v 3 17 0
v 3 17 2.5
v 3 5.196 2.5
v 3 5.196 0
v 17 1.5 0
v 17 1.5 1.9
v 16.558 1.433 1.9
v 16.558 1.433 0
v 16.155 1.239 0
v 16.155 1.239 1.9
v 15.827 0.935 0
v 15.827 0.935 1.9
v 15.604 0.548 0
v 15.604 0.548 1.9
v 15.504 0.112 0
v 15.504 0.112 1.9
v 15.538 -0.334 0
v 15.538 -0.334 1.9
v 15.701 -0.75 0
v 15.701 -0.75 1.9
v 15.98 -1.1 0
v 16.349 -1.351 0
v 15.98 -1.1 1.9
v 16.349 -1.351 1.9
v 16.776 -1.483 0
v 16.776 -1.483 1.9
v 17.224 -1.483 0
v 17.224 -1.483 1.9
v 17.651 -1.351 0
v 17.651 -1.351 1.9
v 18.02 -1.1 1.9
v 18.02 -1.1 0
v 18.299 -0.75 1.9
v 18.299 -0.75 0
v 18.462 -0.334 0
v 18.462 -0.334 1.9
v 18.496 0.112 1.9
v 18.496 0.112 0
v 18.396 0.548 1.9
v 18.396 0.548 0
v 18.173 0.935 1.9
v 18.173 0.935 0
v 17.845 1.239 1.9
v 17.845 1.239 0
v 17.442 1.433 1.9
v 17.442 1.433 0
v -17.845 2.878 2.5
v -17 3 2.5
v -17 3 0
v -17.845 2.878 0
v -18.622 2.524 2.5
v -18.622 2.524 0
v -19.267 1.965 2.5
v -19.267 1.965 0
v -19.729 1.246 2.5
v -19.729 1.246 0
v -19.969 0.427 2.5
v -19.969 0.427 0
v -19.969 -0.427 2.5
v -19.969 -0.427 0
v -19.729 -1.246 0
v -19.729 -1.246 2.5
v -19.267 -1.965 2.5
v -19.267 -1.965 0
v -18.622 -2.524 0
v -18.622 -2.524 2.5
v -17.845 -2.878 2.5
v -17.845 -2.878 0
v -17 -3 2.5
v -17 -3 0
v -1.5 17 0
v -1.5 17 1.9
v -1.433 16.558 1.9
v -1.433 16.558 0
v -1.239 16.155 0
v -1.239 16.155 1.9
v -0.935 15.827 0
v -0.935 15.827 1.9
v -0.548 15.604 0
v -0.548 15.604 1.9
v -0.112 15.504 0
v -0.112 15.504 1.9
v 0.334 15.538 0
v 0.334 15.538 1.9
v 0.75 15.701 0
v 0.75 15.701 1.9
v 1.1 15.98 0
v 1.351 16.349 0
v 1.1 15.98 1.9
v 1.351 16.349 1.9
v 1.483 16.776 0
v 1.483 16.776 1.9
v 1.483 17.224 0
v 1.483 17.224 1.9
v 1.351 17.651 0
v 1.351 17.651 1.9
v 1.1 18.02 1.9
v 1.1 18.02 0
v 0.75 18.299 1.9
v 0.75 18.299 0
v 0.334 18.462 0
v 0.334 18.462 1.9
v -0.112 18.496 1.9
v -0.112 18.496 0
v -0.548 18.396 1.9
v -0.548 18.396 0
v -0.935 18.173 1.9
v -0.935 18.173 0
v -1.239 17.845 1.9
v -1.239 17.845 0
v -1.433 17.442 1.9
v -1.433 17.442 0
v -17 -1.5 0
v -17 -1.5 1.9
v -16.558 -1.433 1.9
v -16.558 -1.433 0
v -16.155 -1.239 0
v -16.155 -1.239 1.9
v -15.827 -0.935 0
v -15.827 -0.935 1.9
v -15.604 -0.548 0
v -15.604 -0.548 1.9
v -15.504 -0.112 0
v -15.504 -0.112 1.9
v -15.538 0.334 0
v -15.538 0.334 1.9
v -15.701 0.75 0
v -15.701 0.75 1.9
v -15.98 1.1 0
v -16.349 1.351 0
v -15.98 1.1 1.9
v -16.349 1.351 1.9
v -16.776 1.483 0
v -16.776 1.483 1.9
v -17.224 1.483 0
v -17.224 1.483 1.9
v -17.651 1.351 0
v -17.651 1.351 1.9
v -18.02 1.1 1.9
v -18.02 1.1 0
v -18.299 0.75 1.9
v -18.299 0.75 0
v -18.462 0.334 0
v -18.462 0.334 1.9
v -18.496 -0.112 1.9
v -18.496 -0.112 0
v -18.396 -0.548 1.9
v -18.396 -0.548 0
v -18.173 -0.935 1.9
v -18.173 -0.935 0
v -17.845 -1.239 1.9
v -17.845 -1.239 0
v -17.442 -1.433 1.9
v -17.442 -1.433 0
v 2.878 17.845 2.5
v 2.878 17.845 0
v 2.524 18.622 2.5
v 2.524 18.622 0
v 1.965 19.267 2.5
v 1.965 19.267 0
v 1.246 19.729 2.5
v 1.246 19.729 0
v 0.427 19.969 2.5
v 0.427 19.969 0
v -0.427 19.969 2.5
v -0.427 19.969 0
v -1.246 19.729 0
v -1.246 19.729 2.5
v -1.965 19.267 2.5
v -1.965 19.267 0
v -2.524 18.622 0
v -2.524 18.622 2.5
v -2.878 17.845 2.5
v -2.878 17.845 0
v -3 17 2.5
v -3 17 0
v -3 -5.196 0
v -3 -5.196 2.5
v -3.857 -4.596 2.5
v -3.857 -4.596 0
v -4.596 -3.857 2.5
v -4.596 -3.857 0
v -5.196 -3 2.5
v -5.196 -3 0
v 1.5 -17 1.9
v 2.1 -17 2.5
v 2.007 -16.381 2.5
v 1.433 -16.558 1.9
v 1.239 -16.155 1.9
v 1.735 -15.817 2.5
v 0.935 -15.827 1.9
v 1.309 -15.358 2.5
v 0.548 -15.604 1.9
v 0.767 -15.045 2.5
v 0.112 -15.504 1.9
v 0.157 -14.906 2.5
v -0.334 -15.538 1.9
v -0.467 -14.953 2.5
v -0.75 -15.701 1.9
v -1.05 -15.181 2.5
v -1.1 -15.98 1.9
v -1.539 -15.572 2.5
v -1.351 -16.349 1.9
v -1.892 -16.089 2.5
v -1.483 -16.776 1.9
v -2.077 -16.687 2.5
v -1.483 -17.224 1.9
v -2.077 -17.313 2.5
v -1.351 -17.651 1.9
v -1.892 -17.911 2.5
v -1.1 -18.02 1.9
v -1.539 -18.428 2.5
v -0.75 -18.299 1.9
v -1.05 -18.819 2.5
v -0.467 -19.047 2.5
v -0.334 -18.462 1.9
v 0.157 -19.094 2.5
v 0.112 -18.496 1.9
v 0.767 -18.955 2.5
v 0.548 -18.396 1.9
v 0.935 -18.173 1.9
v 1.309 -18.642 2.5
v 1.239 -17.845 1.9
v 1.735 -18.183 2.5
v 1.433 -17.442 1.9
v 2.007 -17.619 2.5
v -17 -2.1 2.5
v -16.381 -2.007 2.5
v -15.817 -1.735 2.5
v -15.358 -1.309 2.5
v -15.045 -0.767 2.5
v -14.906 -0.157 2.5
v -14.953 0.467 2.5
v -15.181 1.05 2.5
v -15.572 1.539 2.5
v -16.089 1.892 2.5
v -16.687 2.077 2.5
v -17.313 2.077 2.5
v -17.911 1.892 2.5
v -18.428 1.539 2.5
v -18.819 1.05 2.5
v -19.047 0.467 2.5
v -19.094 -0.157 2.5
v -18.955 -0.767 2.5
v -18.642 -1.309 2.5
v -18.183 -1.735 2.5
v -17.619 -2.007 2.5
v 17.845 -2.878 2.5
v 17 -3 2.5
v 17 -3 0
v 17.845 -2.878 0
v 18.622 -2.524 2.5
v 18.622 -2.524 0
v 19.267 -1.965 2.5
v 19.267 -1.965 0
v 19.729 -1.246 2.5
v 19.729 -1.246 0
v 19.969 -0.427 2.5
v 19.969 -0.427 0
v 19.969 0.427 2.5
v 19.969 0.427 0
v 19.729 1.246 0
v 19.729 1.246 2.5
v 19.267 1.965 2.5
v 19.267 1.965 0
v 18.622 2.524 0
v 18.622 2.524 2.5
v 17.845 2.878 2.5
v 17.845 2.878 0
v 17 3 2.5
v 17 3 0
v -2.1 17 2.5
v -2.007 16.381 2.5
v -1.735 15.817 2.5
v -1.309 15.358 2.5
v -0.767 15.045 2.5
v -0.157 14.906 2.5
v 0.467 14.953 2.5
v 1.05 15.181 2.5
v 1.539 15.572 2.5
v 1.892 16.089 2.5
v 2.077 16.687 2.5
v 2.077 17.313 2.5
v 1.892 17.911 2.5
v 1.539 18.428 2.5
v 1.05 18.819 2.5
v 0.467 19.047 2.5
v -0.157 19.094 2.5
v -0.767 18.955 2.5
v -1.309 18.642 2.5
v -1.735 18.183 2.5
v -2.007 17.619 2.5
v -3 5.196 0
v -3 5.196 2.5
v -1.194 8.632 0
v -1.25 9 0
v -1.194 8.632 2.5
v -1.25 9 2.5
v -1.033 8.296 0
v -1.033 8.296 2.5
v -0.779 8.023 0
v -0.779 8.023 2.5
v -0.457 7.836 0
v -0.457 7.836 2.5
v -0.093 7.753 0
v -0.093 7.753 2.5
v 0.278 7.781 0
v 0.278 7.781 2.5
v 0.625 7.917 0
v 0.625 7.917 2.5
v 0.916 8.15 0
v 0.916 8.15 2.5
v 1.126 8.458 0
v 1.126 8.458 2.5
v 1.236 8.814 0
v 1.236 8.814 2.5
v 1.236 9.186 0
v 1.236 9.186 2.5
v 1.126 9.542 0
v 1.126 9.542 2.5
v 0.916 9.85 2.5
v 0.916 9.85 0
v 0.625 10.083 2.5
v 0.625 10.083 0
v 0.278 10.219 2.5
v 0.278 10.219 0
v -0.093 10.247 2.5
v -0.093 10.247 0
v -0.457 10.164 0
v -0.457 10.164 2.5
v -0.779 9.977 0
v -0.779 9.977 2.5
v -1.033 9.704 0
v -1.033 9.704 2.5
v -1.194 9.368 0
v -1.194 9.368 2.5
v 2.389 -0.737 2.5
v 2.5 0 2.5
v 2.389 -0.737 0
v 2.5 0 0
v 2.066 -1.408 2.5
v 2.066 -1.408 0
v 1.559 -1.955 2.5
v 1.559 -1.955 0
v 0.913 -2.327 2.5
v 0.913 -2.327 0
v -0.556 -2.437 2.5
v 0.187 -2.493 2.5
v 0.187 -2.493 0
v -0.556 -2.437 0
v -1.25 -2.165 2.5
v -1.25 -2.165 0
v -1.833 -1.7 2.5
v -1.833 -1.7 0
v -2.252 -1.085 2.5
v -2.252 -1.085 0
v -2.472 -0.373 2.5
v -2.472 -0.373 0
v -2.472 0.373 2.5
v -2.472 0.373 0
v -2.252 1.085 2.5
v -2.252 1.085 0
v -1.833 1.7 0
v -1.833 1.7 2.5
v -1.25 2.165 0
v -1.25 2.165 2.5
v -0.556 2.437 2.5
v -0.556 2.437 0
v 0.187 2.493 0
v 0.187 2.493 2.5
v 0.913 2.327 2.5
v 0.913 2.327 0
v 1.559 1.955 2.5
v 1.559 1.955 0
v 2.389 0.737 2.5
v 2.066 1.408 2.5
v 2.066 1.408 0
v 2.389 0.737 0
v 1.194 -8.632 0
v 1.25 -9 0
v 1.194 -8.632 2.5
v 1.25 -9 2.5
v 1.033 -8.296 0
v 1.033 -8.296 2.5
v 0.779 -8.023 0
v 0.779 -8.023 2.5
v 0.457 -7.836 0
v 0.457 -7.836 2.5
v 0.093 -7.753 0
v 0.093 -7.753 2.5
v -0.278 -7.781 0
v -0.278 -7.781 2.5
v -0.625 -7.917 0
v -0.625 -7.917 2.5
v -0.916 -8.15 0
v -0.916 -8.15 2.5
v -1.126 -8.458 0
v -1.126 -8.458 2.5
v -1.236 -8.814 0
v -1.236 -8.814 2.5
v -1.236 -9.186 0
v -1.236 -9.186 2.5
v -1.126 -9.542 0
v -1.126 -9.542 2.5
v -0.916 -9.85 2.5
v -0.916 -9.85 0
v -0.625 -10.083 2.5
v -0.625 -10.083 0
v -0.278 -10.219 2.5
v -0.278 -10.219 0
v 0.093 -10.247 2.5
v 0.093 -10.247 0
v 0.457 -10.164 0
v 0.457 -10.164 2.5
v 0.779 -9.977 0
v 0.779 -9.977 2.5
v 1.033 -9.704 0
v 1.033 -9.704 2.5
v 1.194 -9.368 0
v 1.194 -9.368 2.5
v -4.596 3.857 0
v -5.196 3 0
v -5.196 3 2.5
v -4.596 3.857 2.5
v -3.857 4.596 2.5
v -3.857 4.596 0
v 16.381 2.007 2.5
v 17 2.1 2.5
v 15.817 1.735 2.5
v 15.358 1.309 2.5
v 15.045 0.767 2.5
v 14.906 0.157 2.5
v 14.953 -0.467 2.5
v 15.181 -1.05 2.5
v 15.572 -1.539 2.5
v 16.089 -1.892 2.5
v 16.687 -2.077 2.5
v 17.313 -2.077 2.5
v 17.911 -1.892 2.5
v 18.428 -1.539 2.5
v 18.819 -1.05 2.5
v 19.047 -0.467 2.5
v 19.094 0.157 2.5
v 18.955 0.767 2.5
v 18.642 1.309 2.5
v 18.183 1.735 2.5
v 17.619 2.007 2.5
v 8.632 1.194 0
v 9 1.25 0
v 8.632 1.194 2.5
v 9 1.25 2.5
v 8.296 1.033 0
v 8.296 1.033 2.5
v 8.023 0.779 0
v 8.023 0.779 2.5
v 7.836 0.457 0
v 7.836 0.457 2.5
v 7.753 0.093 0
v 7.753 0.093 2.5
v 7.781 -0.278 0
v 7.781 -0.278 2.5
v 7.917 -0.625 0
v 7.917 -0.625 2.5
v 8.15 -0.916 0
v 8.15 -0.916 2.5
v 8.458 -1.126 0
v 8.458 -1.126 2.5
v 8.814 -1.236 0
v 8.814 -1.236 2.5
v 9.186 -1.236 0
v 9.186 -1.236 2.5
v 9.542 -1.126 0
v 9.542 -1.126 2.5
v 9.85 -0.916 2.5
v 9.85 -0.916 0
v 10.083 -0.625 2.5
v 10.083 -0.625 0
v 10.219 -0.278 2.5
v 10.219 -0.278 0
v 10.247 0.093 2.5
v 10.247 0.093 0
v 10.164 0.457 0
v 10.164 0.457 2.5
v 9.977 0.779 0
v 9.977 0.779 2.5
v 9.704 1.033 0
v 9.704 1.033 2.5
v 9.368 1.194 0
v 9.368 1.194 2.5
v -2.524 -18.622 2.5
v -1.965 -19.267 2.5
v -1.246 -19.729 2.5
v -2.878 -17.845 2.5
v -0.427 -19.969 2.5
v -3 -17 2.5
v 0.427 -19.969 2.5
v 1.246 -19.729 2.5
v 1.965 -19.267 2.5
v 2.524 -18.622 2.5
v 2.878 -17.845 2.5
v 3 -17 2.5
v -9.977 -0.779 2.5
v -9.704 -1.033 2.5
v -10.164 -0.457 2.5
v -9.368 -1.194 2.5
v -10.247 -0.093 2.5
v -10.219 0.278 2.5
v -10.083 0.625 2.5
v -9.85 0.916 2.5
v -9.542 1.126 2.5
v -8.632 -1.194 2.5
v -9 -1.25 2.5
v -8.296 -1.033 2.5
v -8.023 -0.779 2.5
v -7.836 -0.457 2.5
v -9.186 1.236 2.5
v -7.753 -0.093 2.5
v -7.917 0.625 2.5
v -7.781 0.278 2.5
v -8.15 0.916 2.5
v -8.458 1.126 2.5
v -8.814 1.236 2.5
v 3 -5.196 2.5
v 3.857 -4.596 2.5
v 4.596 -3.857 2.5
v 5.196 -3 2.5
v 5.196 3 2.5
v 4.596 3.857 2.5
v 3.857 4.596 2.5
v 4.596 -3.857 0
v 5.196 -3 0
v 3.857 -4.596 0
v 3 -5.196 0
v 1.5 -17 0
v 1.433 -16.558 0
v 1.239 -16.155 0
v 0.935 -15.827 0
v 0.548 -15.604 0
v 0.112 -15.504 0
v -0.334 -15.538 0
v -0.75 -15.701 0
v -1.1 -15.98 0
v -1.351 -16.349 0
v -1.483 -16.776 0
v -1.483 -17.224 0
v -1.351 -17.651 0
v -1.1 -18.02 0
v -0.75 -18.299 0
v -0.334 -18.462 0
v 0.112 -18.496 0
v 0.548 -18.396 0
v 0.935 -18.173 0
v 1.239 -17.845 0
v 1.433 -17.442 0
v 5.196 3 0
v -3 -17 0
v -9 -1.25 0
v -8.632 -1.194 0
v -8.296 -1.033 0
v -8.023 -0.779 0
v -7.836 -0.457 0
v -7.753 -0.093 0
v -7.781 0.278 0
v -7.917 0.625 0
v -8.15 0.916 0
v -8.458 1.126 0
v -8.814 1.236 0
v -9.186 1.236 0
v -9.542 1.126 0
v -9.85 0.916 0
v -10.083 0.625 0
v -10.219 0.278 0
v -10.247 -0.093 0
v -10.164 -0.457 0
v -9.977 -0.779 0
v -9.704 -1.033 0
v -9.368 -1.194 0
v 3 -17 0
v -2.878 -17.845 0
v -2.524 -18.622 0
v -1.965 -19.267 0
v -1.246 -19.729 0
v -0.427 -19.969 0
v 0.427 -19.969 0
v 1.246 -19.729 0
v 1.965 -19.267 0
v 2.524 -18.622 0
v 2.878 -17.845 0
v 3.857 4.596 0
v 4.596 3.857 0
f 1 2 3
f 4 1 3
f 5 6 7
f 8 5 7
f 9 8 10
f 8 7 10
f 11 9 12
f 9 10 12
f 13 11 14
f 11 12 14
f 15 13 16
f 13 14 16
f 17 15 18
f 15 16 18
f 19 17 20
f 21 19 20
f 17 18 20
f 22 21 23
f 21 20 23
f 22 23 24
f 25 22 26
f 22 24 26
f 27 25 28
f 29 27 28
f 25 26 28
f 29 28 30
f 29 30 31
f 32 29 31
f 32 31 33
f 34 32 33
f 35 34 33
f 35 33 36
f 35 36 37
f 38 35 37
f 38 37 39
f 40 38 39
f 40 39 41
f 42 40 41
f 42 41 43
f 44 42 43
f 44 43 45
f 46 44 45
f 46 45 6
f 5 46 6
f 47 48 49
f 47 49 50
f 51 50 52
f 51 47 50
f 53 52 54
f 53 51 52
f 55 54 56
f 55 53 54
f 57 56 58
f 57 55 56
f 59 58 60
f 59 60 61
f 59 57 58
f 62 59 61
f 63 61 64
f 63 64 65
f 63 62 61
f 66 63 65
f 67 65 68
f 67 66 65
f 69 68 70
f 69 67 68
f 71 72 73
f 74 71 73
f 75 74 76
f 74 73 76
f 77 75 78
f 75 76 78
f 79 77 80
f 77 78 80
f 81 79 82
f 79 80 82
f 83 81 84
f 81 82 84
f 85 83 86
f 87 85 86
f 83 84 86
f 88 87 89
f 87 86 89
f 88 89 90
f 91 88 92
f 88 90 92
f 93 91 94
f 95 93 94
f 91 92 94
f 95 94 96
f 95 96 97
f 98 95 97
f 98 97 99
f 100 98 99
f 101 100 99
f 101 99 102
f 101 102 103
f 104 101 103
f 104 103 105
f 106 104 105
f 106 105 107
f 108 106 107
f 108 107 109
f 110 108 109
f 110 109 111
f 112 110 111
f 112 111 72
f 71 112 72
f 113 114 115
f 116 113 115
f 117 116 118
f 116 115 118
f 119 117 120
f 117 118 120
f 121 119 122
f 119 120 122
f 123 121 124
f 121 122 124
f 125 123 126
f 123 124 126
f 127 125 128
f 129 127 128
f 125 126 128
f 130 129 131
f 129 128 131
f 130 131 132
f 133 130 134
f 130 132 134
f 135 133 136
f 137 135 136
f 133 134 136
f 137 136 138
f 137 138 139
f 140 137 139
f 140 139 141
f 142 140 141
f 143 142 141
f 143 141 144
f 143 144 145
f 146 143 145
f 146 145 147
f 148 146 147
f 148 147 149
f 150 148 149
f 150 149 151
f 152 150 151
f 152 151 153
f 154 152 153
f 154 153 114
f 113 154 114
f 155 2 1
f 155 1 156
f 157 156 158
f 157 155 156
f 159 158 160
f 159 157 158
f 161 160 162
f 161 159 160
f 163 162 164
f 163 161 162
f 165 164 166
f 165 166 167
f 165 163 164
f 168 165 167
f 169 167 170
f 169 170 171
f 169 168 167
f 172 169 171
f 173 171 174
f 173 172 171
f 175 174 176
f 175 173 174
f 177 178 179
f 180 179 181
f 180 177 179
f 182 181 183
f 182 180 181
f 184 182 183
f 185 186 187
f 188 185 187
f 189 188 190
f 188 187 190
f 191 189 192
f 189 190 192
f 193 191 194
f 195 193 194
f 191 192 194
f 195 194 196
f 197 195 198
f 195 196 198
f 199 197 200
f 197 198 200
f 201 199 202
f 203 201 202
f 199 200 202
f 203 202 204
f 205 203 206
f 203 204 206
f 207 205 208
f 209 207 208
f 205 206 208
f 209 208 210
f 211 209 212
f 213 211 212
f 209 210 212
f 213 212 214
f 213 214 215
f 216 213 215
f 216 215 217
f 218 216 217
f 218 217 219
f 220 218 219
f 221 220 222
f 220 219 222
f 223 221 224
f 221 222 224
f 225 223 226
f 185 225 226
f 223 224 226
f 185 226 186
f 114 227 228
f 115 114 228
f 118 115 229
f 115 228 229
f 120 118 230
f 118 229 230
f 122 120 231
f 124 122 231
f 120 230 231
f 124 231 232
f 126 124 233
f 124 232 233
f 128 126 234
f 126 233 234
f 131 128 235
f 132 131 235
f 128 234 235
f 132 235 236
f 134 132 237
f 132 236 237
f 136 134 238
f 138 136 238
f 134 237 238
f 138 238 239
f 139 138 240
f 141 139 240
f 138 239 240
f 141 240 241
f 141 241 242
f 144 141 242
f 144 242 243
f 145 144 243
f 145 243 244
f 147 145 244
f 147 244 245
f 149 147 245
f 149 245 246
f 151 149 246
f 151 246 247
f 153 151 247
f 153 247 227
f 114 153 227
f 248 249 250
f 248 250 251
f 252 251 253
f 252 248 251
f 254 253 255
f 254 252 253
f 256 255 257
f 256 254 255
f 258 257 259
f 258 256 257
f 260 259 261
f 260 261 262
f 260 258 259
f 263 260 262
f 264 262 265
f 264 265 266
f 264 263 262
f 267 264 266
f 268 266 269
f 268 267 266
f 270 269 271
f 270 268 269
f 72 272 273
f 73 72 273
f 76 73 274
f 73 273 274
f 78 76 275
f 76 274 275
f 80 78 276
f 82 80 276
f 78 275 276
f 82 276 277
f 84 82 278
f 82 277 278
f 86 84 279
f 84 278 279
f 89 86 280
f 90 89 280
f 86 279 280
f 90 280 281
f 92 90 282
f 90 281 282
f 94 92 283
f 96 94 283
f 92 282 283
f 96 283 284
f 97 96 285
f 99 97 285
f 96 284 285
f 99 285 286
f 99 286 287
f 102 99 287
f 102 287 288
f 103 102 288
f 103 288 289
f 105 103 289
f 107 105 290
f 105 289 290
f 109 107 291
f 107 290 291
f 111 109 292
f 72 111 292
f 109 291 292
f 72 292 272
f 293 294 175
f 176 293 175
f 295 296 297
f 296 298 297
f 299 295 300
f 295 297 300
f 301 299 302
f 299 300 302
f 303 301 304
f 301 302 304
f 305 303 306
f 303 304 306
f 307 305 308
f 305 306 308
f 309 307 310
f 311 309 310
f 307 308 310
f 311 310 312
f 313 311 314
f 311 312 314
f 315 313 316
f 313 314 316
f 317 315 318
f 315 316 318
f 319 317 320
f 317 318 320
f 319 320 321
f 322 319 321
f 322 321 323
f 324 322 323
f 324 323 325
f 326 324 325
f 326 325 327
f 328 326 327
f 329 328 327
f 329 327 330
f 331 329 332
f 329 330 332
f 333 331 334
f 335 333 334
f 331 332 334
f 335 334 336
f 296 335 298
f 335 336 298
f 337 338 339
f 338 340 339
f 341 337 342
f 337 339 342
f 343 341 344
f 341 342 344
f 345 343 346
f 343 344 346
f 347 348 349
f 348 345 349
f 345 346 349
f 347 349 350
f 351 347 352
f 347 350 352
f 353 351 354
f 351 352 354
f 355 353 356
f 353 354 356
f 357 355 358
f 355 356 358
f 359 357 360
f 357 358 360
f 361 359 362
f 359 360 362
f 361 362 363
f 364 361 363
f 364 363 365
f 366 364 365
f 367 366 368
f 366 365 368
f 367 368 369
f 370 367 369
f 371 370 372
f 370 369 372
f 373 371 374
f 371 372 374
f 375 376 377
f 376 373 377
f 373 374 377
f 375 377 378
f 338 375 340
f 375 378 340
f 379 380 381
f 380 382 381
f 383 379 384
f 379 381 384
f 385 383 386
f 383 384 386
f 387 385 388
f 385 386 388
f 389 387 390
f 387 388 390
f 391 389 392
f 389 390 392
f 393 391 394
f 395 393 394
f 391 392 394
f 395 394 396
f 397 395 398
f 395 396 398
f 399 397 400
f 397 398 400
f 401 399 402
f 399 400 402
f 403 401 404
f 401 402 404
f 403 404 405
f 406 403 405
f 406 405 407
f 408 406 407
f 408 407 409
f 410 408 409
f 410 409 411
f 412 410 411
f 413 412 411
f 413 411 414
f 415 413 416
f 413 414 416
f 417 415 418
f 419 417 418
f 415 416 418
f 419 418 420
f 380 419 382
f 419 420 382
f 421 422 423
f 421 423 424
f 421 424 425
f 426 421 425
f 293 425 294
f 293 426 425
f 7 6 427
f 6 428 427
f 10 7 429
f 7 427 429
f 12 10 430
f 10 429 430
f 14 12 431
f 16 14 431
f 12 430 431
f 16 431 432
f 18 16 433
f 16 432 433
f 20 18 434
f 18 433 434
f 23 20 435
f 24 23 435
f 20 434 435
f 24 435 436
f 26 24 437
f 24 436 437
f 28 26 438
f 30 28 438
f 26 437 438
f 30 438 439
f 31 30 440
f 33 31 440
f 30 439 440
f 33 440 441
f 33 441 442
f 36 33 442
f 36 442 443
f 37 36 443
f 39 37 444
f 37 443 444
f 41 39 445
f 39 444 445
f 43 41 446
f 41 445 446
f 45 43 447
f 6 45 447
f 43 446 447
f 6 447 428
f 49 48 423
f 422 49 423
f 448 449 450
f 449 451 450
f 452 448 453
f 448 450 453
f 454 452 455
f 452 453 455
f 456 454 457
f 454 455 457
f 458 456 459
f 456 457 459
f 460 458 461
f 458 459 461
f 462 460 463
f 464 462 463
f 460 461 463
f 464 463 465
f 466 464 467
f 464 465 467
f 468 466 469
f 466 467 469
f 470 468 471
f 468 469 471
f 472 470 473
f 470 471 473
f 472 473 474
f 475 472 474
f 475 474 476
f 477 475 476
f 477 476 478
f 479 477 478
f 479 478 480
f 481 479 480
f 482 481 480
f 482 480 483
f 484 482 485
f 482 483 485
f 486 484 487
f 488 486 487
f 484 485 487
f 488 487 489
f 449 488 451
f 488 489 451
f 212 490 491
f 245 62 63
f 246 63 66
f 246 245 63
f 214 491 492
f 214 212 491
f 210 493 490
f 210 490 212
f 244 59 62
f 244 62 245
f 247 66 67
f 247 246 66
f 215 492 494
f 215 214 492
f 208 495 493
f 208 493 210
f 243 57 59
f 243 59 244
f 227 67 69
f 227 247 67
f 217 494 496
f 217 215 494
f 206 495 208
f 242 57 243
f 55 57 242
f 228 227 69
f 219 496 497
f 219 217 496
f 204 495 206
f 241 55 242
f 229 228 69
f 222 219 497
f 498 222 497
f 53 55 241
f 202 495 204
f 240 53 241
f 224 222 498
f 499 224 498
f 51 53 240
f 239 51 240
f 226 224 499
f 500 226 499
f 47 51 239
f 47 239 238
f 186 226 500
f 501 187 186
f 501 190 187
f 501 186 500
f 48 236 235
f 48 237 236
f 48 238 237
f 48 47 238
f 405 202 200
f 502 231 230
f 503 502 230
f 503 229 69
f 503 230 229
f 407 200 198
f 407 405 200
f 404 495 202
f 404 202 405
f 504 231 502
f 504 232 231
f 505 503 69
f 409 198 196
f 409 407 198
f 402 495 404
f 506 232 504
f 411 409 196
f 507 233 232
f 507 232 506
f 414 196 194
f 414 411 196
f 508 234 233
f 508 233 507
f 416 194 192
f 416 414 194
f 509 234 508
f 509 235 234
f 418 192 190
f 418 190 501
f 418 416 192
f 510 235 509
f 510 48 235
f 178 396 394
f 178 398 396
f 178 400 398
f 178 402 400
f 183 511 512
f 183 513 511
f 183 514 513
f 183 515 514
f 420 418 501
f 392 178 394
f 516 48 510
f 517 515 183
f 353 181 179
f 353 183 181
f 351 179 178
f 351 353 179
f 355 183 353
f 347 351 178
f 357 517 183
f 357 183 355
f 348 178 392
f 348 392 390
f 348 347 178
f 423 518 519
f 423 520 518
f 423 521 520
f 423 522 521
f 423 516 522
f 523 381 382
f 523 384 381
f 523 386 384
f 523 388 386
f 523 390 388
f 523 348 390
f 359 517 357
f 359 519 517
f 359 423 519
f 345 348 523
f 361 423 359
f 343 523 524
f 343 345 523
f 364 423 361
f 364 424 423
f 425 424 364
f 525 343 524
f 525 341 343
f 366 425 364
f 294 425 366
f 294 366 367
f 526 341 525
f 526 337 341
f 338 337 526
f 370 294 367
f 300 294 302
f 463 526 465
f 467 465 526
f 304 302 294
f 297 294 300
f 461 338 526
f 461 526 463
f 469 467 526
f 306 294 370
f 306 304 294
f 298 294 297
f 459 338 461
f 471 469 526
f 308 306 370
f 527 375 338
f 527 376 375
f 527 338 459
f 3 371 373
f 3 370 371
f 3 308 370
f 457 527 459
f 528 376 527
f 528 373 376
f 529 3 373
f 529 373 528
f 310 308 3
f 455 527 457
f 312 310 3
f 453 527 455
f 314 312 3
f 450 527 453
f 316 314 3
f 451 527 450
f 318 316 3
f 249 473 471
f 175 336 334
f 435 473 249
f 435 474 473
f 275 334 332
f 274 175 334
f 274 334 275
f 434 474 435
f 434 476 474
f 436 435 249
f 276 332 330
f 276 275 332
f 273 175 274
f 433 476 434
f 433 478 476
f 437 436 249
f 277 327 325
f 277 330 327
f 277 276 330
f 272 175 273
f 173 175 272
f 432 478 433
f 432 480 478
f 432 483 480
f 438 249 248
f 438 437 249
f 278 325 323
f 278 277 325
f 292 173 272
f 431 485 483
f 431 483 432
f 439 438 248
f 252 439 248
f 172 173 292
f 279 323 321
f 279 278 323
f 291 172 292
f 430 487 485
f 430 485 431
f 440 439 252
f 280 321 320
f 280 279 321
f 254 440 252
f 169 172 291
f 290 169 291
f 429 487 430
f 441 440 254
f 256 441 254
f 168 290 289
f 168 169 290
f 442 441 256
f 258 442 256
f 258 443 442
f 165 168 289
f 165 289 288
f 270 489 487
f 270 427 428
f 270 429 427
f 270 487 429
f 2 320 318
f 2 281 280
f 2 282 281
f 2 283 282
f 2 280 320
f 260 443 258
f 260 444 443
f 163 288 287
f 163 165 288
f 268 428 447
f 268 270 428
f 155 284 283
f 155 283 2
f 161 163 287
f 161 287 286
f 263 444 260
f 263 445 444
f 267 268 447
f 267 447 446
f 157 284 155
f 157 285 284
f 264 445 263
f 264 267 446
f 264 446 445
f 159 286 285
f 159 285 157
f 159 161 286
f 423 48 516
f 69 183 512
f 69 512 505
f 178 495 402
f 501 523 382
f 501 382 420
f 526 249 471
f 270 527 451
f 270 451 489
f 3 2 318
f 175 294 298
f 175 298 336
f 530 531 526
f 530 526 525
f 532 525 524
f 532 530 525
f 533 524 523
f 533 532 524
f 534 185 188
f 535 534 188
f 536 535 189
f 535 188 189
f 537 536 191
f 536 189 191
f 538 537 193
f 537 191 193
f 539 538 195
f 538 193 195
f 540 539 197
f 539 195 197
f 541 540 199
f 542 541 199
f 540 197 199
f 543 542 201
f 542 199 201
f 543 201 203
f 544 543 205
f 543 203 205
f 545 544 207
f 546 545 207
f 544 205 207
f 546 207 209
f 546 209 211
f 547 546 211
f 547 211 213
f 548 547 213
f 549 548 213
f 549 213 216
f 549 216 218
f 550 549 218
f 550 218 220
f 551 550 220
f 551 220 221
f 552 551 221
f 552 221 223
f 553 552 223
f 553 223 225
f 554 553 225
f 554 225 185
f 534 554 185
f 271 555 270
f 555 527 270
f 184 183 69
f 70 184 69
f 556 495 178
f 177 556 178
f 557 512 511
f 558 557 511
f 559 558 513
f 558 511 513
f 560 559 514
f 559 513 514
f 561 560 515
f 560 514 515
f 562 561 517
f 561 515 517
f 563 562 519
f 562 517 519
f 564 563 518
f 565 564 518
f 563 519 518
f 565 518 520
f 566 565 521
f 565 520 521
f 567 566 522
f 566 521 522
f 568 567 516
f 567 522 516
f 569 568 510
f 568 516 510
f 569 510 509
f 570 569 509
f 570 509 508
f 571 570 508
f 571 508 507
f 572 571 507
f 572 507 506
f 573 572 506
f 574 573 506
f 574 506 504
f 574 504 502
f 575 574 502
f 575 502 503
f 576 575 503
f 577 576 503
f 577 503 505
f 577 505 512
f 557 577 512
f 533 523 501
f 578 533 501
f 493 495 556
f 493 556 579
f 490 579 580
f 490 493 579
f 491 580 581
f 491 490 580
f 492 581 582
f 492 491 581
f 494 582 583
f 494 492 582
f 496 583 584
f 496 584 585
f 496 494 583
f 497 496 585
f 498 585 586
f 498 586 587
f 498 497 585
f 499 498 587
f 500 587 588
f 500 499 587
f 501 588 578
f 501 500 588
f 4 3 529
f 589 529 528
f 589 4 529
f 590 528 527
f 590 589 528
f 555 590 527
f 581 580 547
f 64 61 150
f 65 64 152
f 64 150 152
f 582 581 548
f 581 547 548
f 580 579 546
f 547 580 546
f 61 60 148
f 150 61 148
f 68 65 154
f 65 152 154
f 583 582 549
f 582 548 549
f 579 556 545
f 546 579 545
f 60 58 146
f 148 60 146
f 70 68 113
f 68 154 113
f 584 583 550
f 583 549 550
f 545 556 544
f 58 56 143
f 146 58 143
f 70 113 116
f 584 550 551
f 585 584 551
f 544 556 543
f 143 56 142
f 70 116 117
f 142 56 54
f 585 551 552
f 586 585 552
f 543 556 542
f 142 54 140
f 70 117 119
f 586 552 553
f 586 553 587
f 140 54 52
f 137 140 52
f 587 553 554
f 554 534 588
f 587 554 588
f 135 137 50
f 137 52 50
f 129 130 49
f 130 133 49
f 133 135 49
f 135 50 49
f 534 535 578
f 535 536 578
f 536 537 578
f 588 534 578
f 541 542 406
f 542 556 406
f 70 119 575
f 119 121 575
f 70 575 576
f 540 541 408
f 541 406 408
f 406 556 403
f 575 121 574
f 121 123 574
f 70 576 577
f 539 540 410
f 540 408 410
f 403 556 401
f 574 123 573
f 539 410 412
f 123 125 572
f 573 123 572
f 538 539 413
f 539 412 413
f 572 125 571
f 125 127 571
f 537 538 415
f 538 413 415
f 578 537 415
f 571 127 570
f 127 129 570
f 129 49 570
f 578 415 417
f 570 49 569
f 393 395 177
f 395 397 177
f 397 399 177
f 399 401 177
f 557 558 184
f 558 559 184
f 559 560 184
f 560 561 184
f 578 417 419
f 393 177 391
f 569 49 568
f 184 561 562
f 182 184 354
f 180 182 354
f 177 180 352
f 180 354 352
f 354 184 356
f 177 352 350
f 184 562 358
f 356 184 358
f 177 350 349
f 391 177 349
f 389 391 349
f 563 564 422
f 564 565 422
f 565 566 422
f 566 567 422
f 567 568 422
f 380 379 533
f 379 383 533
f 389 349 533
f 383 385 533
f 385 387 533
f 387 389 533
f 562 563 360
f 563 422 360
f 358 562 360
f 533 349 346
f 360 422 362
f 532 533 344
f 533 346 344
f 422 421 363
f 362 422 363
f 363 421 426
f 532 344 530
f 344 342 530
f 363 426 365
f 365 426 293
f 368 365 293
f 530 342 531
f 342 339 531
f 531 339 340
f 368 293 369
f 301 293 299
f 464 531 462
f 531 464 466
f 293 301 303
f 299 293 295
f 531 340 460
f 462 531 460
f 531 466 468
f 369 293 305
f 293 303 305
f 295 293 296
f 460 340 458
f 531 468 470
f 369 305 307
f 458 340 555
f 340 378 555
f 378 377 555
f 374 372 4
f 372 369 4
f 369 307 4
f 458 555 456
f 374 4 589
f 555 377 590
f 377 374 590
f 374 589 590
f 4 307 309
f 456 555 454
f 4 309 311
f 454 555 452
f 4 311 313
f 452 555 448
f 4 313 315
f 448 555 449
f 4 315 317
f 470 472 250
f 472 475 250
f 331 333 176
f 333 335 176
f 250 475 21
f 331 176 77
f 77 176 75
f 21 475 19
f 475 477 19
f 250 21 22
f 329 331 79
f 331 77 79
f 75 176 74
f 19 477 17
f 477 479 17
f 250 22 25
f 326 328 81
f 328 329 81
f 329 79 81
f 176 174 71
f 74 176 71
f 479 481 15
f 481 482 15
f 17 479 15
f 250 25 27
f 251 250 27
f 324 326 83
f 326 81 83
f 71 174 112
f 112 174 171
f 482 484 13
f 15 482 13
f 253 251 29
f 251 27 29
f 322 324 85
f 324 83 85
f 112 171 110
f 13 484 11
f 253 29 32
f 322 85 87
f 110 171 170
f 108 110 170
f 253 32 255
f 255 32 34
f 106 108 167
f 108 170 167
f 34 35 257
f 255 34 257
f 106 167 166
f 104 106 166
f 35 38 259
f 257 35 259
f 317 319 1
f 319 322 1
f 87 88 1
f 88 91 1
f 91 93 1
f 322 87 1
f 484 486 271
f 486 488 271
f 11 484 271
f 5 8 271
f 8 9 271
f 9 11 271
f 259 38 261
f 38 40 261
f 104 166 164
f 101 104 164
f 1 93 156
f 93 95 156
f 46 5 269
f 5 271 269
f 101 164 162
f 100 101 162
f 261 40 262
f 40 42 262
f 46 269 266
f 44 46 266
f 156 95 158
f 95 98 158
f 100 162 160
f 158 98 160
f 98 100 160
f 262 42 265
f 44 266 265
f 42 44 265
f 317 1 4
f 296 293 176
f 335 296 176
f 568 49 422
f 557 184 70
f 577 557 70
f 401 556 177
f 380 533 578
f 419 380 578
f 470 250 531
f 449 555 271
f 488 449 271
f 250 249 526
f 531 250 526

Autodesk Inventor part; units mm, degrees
ref_plane "YZ Plane" through (0, 0, 0) normal (1, 0, 0) x (0, 1, 0)
ref_plane "XZ Plane" through (0, 0, 0) normal (0, 1, 0) x (-1, 0, 0)
ref_plane "XY Plane" through (0, 0, 0) normal (0, 0, 1) x (1, 0, 0)
sketch "Sketch2" plane through (0, 0, 0) normal (0, 0, 1) x (1, 0, 0)
  circle A0 centre (0, 0) radius 2.5
  circle A1 centre (0, 0) radius 6
  dimension "d12" = 5
  dimension "d13" = 12
extrude "Extrusion1" add sketch "Sketch2" along normal blind 2.5
sketch "Sketch3" plane through (0, 0, 2.5) normal (0, 0, 1) x (1, 0, 0)
  circle A0 centre (0, 0) radius 2.5 projected
  circle A1 centre (0, 0) radius 6 projected
  line L0 (0, 0) -> (0, -18.3723) construction
  circle A2 centre (0, -17) radius 1.5
  circle A3 centre (0, -9) radius 1.25
  line L1 (3, -5.1962) -> (3, -17)
  line L2 (-3, -17) -> (-3, -5.1962)
  line L3 (5.4814, -17) -> (-5.6867, -17) construction
  arc A4 (-3, -17) -> (3, -17) centre (0, -17) ccw
  dimension "d16" = 3
  dimension "d17" = 2.5
  dimension "d18" = 9
  dimension "d19" = 17
  dimension "d20" = 3
  dimension "d21" = 3
extrude "Extrusion2" add sketch "Sketch3" against normal blind 2.5 contours A1 L1 A4 L2
pattern_circular "Circular Pattern1" count 4 over 360 about axis through (0, 0, 0) along (0, 0, 1) of "Extrusion2"
chamfer "Chamfer1" distance 0.6 angle 45 4 edges at (-1.5, -17, 2.5) (17, -1.5, 2.5) (-17, 1.5, 2.5) (1.5, 17, 2.5)
equation "\"d21\" = d20"
properties part number "HK 2830 mounting plate"
